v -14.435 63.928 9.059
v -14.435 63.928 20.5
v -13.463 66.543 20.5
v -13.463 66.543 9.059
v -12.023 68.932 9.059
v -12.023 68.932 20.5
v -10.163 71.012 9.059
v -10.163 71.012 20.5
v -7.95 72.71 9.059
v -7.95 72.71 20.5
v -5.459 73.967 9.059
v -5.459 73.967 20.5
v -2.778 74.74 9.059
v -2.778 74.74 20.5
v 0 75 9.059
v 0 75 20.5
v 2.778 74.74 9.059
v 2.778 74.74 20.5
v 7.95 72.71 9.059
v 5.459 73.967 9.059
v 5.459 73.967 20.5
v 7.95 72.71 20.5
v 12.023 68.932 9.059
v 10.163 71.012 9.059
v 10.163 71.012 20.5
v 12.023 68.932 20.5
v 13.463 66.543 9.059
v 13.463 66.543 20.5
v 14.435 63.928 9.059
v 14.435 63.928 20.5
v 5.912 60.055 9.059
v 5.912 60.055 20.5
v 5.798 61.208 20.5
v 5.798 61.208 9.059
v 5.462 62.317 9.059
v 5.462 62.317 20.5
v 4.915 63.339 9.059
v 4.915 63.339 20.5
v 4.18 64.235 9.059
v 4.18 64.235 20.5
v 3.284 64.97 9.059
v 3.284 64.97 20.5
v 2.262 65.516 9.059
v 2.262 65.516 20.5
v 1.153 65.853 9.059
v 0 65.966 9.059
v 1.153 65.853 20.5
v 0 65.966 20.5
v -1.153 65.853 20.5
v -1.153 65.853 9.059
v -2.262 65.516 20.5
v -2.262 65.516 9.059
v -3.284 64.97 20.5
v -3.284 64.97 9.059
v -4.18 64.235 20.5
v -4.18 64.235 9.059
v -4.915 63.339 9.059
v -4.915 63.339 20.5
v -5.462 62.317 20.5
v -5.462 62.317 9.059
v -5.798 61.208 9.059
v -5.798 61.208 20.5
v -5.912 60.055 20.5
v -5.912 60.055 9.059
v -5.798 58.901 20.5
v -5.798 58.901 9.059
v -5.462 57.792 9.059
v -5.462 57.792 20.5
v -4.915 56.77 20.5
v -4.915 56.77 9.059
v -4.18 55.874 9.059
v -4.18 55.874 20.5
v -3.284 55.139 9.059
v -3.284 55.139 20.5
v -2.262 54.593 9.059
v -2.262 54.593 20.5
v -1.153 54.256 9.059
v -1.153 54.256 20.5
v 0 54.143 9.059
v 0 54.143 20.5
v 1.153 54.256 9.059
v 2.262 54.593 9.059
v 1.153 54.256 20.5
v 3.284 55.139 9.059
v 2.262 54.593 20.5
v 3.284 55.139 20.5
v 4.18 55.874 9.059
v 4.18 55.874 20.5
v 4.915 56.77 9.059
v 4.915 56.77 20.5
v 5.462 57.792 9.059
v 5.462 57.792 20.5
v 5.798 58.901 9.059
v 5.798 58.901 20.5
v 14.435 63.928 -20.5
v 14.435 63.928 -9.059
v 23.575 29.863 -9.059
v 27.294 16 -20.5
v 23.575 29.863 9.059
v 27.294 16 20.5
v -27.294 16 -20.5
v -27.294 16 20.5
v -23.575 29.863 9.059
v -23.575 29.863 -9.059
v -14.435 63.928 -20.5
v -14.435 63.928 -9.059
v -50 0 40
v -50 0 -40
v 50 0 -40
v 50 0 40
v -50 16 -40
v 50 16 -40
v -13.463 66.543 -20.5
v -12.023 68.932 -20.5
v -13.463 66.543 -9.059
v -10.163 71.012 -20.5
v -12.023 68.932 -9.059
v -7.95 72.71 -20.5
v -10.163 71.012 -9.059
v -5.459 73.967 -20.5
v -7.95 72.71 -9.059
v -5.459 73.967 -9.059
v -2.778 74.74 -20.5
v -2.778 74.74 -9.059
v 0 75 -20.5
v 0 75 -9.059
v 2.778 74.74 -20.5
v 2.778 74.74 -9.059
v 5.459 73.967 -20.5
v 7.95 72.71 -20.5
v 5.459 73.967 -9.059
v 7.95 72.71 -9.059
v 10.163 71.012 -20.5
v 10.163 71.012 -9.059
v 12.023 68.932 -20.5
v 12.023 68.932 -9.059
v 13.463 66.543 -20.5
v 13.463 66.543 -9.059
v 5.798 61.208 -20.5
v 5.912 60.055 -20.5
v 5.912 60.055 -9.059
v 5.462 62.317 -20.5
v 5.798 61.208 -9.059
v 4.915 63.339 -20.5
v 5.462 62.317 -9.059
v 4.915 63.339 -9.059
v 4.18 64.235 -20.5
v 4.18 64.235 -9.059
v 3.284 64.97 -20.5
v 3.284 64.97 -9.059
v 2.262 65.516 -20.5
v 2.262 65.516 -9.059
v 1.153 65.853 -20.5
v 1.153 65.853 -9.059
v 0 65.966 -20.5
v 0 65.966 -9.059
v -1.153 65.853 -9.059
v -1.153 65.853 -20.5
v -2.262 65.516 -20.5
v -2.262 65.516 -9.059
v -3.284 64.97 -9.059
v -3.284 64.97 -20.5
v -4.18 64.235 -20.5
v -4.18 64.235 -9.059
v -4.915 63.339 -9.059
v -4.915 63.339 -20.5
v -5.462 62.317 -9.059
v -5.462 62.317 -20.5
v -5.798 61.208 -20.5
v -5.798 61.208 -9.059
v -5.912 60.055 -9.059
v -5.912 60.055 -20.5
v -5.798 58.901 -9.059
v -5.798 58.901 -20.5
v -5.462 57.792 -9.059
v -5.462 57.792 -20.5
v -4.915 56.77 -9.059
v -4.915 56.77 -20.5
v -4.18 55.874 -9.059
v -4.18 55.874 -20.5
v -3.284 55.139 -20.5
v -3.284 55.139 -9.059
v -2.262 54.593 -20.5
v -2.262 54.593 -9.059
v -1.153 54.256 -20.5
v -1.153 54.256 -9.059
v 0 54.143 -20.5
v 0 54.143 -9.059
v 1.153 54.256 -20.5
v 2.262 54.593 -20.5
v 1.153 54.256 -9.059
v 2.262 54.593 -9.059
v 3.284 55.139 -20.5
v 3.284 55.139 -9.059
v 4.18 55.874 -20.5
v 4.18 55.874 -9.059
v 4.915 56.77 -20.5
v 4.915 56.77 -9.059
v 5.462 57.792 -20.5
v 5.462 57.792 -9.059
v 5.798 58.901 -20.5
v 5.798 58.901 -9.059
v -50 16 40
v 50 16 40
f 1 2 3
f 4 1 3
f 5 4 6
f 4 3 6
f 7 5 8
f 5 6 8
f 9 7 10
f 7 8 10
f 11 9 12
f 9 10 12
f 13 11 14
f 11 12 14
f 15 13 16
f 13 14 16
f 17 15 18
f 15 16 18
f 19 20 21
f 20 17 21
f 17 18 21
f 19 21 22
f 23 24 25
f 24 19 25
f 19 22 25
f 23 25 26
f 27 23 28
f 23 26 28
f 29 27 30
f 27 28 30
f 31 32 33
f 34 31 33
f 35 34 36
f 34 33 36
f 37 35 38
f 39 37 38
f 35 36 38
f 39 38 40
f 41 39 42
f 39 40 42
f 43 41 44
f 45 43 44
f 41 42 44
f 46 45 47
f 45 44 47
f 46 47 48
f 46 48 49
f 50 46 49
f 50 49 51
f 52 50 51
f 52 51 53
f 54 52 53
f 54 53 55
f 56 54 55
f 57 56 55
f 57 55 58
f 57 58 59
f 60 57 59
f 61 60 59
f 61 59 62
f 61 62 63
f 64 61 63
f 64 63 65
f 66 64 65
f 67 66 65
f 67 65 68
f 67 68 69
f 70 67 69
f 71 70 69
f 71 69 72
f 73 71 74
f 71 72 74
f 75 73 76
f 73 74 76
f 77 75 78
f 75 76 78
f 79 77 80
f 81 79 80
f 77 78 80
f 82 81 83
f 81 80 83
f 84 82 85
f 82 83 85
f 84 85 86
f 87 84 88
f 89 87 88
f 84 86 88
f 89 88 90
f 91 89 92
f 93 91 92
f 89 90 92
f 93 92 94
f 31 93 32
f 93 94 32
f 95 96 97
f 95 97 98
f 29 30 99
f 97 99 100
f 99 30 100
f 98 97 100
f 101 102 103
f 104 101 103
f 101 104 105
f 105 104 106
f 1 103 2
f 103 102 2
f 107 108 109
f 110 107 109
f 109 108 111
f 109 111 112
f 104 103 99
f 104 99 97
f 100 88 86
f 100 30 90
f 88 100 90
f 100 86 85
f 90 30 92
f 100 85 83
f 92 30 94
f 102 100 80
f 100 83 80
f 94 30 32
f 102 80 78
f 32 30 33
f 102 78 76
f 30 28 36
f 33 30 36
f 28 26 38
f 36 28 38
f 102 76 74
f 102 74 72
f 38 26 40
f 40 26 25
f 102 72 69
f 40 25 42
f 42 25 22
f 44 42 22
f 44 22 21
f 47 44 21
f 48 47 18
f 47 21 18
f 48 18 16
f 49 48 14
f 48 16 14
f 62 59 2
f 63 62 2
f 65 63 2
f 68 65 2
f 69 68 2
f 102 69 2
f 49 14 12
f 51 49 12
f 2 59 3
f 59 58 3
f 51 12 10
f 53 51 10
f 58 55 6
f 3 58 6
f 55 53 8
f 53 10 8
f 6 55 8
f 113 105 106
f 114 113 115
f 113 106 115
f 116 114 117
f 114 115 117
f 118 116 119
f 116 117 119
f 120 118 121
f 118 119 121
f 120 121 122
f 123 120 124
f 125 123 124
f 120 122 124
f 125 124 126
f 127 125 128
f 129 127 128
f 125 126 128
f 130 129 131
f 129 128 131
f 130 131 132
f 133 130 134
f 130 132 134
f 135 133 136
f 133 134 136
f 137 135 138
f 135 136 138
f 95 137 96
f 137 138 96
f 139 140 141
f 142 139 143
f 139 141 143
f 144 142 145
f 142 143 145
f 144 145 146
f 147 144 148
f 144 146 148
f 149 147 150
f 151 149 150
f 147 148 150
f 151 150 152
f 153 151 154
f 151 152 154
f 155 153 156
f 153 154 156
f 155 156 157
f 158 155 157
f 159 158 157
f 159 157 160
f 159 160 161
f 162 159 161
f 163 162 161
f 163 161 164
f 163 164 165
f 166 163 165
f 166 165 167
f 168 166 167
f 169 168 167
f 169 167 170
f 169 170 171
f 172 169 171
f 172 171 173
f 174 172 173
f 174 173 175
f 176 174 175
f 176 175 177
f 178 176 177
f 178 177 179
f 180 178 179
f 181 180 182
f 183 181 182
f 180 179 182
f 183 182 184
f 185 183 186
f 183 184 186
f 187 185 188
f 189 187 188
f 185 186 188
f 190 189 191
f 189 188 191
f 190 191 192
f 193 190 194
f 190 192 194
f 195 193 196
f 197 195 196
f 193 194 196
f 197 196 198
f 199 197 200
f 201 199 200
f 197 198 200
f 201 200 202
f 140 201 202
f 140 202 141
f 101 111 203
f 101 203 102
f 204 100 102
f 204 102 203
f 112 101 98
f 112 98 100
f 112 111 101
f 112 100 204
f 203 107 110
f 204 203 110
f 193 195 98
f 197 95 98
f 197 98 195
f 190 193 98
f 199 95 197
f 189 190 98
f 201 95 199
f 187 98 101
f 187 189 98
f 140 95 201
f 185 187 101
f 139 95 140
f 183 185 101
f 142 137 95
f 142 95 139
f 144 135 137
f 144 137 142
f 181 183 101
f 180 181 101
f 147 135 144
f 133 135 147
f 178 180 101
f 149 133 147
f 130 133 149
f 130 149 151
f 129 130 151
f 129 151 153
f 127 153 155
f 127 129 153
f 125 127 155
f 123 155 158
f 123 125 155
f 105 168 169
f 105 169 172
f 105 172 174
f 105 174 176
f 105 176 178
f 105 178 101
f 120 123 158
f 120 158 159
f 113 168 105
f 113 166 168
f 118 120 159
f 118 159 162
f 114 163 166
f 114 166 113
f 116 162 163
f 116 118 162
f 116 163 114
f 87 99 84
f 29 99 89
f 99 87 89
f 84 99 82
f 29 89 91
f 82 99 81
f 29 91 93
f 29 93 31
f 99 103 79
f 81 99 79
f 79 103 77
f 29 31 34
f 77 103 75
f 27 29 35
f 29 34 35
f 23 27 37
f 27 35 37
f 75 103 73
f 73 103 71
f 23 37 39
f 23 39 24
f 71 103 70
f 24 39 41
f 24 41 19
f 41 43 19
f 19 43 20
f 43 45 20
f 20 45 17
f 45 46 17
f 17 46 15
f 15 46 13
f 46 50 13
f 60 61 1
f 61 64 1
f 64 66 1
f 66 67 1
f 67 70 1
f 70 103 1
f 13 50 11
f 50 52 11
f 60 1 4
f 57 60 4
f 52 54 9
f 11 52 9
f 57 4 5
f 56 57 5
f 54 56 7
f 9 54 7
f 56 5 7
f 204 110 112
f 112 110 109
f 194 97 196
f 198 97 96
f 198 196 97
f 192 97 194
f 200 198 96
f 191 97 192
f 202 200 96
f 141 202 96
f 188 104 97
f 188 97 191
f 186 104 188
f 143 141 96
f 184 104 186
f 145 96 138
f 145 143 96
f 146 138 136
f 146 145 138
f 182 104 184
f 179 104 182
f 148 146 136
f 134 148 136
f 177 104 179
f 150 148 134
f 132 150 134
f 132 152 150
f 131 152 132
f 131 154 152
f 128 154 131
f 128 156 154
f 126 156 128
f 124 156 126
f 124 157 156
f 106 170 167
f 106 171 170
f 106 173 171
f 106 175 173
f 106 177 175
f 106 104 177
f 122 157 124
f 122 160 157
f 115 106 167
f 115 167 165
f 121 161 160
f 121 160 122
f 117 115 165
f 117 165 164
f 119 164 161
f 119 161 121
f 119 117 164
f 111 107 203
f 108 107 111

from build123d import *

# Parameters (mm, degrees)
SKETCH3_W               = 100
SKETCH3_H               = 80
BOSS_EXTRUDE2_DEPTH     = 16
BOSS_EXTRUDE3_DEPTH     = 20.5
SKETCH6_R               = 5.911815165
CUT_EXTRUDE1_DEPTH      = 109.559891304
CUT_EXTRUDE2_DEPTH      = 99.615414617
CUT_EXTRUDE2_DEPTH_BACK = 99.615414617
SKETCH8_W               = 18.118513472
SKETCH8_H               = 45.137164109


with BuildPart() as part:
    # Sketch3 → Boss-Extrude2 (new body)
    with BuildSketch(Plane(origin=(0, 0, 0), x_dir=(1, 0, 0), z_dir=(0, 1, 0))):
        Rectangle(SKETCH3_W, SKETCH3_H)
    extrude(amount=BOSS_EXTRUDE2_DEPTH)

    # Sketch5 → Boss-Extrude3 (add, symmetric)
    with BuildSketch(Plane.XY):
        with BuildLine():
            Line((-27.294131566, 16), (-14.434798789, 63.927620339))
            ThreePointArc((-14.434798789, 63.927620339), (0, 75), (14.434798789, 63.927620339))
            Line((14.434798789, 63.927620339), (27.294131566, 16))
            Line((27.294131566, 16), (-27.294131566, 16))
        make_face()
    extrude(amount=BOSS_EXTRUDE3_DEPTH, both=True)

    # Sketch6 → Cut-Extrude1 (cut, through all)
    with BuildSketch(Plane.XY.offset(20.5)):
        with Locations((0, 60.054657736)):
            Circle(SKETCH6_R)
    extrude(amount=-CUT_EXTRUDE1_DEPTH, mode=Mode.SUBTRACT)

    # Sketch8 → Cut-Extrude2 (cut, two sides: drawn at the far end of the back side and taken through both)
    with BuildSketch(Plane(origin=(0, 0, 0), x_dir=(0, 0, -1), z_dir=(1, 0, 0)).offset(-CUT_EXTRUDE2_DEPTH_BACK)):
        with Locations((0, 52.431417946)):
            Rectangle(SKETCH8_W, SKETCH8_H)
    extrude(amount=CUT_EXTRUDE2_DEPTH + CUT_EXTRUDE2_DEPTH_BACK, mode=Mode.SUBTRACT)


solid = part.part
